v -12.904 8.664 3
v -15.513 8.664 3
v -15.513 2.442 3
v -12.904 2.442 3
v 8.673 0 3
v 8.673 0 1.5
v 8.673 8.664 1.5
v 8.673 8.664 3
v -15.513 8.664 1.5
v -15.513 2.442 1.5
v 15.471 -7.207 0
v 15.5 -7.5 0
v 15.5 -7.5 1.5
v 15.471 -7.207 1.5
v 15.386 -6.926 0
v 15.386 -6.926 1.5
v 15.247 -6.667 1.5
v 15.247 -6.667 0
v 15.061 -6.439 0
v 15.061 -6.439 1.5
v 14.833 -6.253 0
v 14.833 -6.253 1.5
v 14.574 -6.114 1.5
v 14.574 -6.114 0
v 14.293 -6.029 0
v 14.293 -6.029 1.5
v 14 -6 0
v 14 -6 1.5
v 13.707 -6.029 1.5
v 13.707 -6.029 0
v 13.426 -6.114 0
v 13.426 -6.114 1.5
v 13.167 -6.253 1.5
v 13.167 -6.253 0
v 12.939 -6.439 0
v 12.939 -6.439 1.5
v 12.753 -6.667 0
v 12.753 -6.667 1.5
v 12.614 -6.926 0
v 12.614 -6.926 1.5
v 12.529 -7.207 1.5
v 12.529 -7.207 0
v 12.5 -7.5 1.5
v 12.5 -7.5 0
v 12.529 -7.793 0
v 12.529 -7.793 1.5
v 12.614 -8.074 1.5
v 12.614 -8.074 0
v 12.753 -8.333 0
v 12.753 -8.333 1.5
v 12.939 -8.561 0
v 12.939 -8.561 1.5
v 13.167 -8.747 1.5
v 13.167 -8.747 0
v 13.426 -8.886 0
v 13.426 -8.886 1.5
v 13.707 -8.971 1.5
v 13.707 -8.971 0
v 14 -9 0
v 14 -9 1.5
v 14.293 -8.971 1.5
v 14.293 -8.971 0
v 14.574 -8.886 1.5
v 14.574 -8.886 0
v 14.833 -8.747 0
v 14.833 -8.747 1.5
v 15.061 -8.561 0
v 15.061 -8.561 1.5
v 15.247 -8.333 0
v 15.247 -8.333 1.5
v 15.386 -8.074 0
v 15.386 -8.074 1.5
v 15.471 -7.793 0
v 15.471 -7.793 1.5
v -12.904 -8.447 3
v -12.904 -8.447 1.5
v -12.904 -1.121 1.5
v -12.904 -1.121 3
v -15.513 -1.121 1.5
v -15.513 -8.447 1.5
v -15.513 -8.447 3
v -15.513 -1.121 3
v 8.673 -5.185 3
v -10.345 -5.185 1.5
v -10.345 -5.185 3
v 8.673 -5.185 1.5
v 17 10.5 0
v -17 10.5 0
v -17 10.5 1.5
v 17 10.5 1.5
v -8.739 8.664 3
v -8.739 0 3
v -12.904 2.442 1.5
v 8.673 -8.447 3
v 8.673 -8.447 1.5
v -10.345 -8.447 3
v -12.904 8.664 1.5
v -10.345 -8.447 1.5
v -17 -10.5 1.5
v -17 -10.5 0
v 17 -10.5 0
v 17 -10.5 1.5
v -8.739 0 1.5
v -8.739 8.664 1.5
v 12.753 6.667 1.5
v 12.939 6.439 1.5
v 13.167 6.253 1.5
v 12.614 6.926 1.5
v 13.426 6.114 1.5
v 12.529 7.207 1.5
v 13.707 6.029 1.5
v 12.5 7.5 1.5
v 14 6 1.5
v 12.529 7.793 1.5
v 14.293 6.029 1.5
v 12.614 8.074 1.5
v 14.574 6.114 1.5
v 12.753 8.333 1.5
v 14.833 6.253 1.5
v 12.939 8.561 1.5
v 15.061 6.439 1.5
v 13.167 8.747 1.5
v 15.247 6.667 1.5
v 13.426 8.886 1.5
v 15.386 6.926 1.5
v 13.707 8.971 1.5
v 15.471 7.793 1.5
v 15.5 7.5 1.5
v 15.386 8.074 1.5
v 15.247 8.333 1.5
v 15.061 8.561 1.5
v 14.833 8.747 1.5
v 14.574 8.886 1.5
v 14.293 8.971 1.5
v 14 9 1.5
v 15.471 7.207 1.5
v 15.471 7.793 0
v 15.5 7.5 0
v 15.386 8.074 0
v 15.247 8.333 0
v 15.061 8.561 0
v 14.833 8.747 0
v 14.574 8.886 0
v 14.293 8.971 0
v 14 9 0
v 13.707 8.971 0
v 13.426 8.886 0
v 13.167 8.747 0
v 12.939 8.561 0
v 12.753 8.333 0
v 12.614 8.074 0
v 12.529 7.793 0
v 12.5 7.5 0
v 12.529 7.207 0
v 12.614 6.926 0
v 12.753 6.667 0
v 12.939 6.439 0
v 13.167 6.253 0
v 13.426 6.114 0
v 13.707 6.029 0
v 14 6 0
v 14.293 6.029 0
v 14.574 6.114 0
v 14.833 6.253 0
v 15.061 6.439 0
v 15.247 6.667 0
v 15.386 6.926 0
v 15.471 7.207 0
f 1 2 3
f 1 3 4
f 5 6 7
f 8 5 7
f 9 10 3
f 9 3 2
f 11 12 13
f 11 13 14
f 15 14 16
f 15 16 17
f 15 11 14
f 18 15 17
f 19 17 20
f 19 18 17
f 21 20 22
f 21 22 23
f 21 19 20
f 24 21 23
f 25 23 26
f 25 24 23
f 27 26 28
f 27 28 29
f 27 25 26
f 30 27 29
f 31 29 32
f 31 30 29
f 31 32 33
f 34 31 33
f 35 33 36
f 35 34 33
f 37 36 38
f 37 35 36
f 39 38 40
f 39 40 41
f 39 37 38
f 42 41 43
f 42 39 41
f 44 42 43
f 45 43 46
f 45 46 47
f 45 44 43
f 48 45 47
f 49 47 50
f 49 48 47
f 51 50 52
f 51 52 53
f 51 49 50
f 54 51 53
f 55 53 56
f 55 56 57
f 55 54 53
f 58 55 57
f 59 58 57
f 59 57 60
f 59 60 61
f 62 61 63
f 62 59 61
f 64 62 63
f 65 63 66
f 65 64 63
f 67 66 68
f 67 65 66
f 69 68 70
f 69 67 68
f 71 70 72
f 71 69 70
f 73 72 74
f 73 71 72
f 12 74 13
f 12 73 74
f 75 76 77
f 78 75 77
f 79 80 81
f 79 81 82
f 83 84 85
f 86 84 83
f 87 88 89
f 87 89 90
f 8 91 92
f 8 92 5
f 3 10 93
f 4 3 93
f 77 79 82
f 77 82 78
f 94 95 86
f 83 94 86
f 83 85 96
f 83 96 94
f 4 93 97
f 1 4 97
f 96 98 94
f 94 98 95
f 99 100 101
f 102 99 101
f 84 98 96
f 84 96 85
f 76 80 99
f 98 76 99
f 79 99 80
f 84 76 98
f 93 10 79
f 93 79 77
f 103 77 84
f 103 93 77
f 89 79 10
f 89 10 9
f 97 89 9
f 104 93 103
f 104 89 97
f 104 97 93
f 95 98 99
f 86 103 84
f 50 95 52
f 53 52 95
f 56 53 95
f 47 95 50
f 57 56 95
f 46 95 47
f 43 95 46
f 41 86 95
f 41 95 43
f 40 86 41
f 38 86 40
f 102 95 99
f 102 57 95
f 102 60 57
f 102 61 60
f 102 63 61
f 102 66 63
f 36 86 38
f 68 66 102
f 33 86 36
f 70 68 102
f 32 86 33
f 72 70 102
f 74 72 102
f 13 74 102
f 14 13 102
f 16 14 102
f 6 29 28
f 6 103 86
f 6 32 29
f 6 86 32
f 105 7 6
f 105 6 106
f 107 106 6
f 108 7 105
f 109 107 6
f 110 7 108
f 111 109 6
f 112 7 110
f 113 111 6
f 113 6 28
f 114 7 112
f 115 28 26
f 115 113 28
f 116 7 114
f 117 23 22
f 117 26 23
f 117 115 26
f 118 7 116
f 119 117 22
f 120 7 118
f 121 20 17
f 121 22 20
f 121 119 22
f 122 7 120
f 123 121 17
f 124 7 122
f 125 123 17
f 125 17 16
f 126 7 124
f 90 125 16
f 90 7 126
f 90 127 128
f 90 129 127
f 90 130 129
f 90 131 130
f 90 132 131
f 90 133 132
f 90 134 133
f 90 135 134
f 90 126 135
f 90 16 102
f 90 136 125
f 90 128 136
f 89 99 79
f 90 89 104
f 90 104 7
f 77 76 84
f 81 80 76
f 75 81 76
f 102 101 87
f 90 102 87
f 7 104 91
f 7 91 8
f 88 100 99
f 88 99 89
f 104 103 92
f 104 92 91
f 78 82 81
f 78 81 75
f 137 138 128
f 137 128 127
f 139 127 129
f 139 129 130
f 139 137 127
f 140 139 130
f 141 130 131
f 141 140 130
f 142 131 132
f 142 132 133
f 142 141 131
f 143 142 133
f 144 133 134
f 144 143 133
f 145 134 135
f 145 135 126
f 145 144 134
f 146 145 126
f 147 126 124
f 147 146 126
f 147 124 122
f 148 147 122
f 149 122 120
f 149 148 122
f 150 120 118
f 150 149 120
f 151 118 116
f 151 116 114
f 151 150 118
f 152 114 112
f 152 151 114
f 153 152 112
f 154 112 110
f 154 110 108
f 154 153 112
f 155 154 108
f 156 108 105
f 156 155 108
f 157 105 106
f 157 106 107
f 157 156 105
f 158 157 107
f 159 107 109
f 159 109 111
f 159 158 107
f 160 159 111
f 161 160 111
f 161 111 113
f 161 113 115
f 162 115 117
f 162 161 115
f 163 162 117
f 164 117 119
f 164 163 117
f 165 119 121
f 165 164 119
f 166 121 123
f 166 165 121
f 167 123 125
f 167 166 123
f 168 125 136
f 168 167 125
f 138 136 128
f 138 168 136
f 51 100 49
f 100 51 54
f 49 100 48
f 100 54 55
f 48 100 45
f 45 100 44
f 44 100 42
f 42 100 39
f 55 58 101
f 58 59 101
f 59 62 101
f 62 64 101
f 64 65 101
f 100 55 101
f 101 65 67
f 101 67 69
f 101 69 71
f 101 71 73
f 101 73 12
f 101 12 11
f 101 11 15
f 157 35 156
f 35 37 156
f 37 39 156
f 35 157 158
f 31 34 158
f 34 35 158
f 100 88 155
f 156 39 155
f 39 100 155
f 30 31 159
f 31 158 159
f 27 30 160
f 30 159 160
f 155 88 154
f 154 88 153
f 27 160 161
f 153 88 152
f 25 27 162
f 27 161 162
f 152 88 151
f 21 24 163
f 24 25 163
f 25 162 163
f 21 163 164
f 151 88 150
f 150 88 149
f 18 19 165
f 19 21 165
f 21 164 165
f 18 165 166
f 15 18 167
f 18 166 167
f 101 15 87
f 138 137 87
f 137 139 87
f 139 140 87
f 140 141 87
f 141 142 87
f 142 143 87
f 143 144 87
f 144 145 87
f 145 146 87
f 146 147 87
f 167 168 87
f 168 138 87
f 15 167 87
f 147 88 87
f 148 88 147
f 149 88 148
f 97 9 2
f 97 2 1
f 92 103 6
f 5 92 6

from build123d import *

# Parameters (mm, degrees)
SKETCH_1_W      = 34
SKETCH_1_H      = 21
SKETCH_1_R      = 1.5
EXTRUDE_1_DEPTH = 1.5
SKETCH_2_W      = 2.609332225
SKETCH_2_H      = 6.222253767
SKETCH_2_H_2    = 7.326202017
SKETCH_2_W_2    = 17.412274655
SKETCH_2_H_3    = 8.664478865
SKETCH_2_W_3    = 19.018017562
SKETCH_2_H_4    = 3.261665282
EXTRUDE_2_DEPTH = 1.5


with BuildPart() as part:
    # 草图1 → 凸台-拉伸1 (new body)
    with BuildSketch(Plane.XY):
        Rectangle(SKETCH_1_W, SKETCH_1_H)
        with Locations((14, 7.5)):
            Circle(SKETCH_1_R, mode=Mode.SUBTRACT)
        with Locations((14, -7.5)):
            Circle(SKETCH_1_R, mode=Mode.SUBTRACT)
    extrude(amount=EXTRUDE_1_DEPTH)

    # 草图2 → 凸台-拉伸2 (add)
    with BuildSketch(Plane.XY.offset(1.5)):
        with Locations((-14.208471454, 5.553351982)):
            Rectangle(SKETCH_2_W, SKETCH_2_H)
        with Locations((-14.208471454, -4.783617987)):
            Rectangle(SKETCH_2_W, SKETCH_2_H_2)
        with Locations((-0.032772348, 4.332239433)):
            Rectangle(SKETCH_2_W_2, SKETCH_2_H_3)
        with Locations((-0.835643802, -6.815886354)):
            Rectangle(SKETCH_2_W_3, SKETCH_2_H_4)
    extrude(amount=EXTRUDE_2_DEPTH)


solid = part.part
